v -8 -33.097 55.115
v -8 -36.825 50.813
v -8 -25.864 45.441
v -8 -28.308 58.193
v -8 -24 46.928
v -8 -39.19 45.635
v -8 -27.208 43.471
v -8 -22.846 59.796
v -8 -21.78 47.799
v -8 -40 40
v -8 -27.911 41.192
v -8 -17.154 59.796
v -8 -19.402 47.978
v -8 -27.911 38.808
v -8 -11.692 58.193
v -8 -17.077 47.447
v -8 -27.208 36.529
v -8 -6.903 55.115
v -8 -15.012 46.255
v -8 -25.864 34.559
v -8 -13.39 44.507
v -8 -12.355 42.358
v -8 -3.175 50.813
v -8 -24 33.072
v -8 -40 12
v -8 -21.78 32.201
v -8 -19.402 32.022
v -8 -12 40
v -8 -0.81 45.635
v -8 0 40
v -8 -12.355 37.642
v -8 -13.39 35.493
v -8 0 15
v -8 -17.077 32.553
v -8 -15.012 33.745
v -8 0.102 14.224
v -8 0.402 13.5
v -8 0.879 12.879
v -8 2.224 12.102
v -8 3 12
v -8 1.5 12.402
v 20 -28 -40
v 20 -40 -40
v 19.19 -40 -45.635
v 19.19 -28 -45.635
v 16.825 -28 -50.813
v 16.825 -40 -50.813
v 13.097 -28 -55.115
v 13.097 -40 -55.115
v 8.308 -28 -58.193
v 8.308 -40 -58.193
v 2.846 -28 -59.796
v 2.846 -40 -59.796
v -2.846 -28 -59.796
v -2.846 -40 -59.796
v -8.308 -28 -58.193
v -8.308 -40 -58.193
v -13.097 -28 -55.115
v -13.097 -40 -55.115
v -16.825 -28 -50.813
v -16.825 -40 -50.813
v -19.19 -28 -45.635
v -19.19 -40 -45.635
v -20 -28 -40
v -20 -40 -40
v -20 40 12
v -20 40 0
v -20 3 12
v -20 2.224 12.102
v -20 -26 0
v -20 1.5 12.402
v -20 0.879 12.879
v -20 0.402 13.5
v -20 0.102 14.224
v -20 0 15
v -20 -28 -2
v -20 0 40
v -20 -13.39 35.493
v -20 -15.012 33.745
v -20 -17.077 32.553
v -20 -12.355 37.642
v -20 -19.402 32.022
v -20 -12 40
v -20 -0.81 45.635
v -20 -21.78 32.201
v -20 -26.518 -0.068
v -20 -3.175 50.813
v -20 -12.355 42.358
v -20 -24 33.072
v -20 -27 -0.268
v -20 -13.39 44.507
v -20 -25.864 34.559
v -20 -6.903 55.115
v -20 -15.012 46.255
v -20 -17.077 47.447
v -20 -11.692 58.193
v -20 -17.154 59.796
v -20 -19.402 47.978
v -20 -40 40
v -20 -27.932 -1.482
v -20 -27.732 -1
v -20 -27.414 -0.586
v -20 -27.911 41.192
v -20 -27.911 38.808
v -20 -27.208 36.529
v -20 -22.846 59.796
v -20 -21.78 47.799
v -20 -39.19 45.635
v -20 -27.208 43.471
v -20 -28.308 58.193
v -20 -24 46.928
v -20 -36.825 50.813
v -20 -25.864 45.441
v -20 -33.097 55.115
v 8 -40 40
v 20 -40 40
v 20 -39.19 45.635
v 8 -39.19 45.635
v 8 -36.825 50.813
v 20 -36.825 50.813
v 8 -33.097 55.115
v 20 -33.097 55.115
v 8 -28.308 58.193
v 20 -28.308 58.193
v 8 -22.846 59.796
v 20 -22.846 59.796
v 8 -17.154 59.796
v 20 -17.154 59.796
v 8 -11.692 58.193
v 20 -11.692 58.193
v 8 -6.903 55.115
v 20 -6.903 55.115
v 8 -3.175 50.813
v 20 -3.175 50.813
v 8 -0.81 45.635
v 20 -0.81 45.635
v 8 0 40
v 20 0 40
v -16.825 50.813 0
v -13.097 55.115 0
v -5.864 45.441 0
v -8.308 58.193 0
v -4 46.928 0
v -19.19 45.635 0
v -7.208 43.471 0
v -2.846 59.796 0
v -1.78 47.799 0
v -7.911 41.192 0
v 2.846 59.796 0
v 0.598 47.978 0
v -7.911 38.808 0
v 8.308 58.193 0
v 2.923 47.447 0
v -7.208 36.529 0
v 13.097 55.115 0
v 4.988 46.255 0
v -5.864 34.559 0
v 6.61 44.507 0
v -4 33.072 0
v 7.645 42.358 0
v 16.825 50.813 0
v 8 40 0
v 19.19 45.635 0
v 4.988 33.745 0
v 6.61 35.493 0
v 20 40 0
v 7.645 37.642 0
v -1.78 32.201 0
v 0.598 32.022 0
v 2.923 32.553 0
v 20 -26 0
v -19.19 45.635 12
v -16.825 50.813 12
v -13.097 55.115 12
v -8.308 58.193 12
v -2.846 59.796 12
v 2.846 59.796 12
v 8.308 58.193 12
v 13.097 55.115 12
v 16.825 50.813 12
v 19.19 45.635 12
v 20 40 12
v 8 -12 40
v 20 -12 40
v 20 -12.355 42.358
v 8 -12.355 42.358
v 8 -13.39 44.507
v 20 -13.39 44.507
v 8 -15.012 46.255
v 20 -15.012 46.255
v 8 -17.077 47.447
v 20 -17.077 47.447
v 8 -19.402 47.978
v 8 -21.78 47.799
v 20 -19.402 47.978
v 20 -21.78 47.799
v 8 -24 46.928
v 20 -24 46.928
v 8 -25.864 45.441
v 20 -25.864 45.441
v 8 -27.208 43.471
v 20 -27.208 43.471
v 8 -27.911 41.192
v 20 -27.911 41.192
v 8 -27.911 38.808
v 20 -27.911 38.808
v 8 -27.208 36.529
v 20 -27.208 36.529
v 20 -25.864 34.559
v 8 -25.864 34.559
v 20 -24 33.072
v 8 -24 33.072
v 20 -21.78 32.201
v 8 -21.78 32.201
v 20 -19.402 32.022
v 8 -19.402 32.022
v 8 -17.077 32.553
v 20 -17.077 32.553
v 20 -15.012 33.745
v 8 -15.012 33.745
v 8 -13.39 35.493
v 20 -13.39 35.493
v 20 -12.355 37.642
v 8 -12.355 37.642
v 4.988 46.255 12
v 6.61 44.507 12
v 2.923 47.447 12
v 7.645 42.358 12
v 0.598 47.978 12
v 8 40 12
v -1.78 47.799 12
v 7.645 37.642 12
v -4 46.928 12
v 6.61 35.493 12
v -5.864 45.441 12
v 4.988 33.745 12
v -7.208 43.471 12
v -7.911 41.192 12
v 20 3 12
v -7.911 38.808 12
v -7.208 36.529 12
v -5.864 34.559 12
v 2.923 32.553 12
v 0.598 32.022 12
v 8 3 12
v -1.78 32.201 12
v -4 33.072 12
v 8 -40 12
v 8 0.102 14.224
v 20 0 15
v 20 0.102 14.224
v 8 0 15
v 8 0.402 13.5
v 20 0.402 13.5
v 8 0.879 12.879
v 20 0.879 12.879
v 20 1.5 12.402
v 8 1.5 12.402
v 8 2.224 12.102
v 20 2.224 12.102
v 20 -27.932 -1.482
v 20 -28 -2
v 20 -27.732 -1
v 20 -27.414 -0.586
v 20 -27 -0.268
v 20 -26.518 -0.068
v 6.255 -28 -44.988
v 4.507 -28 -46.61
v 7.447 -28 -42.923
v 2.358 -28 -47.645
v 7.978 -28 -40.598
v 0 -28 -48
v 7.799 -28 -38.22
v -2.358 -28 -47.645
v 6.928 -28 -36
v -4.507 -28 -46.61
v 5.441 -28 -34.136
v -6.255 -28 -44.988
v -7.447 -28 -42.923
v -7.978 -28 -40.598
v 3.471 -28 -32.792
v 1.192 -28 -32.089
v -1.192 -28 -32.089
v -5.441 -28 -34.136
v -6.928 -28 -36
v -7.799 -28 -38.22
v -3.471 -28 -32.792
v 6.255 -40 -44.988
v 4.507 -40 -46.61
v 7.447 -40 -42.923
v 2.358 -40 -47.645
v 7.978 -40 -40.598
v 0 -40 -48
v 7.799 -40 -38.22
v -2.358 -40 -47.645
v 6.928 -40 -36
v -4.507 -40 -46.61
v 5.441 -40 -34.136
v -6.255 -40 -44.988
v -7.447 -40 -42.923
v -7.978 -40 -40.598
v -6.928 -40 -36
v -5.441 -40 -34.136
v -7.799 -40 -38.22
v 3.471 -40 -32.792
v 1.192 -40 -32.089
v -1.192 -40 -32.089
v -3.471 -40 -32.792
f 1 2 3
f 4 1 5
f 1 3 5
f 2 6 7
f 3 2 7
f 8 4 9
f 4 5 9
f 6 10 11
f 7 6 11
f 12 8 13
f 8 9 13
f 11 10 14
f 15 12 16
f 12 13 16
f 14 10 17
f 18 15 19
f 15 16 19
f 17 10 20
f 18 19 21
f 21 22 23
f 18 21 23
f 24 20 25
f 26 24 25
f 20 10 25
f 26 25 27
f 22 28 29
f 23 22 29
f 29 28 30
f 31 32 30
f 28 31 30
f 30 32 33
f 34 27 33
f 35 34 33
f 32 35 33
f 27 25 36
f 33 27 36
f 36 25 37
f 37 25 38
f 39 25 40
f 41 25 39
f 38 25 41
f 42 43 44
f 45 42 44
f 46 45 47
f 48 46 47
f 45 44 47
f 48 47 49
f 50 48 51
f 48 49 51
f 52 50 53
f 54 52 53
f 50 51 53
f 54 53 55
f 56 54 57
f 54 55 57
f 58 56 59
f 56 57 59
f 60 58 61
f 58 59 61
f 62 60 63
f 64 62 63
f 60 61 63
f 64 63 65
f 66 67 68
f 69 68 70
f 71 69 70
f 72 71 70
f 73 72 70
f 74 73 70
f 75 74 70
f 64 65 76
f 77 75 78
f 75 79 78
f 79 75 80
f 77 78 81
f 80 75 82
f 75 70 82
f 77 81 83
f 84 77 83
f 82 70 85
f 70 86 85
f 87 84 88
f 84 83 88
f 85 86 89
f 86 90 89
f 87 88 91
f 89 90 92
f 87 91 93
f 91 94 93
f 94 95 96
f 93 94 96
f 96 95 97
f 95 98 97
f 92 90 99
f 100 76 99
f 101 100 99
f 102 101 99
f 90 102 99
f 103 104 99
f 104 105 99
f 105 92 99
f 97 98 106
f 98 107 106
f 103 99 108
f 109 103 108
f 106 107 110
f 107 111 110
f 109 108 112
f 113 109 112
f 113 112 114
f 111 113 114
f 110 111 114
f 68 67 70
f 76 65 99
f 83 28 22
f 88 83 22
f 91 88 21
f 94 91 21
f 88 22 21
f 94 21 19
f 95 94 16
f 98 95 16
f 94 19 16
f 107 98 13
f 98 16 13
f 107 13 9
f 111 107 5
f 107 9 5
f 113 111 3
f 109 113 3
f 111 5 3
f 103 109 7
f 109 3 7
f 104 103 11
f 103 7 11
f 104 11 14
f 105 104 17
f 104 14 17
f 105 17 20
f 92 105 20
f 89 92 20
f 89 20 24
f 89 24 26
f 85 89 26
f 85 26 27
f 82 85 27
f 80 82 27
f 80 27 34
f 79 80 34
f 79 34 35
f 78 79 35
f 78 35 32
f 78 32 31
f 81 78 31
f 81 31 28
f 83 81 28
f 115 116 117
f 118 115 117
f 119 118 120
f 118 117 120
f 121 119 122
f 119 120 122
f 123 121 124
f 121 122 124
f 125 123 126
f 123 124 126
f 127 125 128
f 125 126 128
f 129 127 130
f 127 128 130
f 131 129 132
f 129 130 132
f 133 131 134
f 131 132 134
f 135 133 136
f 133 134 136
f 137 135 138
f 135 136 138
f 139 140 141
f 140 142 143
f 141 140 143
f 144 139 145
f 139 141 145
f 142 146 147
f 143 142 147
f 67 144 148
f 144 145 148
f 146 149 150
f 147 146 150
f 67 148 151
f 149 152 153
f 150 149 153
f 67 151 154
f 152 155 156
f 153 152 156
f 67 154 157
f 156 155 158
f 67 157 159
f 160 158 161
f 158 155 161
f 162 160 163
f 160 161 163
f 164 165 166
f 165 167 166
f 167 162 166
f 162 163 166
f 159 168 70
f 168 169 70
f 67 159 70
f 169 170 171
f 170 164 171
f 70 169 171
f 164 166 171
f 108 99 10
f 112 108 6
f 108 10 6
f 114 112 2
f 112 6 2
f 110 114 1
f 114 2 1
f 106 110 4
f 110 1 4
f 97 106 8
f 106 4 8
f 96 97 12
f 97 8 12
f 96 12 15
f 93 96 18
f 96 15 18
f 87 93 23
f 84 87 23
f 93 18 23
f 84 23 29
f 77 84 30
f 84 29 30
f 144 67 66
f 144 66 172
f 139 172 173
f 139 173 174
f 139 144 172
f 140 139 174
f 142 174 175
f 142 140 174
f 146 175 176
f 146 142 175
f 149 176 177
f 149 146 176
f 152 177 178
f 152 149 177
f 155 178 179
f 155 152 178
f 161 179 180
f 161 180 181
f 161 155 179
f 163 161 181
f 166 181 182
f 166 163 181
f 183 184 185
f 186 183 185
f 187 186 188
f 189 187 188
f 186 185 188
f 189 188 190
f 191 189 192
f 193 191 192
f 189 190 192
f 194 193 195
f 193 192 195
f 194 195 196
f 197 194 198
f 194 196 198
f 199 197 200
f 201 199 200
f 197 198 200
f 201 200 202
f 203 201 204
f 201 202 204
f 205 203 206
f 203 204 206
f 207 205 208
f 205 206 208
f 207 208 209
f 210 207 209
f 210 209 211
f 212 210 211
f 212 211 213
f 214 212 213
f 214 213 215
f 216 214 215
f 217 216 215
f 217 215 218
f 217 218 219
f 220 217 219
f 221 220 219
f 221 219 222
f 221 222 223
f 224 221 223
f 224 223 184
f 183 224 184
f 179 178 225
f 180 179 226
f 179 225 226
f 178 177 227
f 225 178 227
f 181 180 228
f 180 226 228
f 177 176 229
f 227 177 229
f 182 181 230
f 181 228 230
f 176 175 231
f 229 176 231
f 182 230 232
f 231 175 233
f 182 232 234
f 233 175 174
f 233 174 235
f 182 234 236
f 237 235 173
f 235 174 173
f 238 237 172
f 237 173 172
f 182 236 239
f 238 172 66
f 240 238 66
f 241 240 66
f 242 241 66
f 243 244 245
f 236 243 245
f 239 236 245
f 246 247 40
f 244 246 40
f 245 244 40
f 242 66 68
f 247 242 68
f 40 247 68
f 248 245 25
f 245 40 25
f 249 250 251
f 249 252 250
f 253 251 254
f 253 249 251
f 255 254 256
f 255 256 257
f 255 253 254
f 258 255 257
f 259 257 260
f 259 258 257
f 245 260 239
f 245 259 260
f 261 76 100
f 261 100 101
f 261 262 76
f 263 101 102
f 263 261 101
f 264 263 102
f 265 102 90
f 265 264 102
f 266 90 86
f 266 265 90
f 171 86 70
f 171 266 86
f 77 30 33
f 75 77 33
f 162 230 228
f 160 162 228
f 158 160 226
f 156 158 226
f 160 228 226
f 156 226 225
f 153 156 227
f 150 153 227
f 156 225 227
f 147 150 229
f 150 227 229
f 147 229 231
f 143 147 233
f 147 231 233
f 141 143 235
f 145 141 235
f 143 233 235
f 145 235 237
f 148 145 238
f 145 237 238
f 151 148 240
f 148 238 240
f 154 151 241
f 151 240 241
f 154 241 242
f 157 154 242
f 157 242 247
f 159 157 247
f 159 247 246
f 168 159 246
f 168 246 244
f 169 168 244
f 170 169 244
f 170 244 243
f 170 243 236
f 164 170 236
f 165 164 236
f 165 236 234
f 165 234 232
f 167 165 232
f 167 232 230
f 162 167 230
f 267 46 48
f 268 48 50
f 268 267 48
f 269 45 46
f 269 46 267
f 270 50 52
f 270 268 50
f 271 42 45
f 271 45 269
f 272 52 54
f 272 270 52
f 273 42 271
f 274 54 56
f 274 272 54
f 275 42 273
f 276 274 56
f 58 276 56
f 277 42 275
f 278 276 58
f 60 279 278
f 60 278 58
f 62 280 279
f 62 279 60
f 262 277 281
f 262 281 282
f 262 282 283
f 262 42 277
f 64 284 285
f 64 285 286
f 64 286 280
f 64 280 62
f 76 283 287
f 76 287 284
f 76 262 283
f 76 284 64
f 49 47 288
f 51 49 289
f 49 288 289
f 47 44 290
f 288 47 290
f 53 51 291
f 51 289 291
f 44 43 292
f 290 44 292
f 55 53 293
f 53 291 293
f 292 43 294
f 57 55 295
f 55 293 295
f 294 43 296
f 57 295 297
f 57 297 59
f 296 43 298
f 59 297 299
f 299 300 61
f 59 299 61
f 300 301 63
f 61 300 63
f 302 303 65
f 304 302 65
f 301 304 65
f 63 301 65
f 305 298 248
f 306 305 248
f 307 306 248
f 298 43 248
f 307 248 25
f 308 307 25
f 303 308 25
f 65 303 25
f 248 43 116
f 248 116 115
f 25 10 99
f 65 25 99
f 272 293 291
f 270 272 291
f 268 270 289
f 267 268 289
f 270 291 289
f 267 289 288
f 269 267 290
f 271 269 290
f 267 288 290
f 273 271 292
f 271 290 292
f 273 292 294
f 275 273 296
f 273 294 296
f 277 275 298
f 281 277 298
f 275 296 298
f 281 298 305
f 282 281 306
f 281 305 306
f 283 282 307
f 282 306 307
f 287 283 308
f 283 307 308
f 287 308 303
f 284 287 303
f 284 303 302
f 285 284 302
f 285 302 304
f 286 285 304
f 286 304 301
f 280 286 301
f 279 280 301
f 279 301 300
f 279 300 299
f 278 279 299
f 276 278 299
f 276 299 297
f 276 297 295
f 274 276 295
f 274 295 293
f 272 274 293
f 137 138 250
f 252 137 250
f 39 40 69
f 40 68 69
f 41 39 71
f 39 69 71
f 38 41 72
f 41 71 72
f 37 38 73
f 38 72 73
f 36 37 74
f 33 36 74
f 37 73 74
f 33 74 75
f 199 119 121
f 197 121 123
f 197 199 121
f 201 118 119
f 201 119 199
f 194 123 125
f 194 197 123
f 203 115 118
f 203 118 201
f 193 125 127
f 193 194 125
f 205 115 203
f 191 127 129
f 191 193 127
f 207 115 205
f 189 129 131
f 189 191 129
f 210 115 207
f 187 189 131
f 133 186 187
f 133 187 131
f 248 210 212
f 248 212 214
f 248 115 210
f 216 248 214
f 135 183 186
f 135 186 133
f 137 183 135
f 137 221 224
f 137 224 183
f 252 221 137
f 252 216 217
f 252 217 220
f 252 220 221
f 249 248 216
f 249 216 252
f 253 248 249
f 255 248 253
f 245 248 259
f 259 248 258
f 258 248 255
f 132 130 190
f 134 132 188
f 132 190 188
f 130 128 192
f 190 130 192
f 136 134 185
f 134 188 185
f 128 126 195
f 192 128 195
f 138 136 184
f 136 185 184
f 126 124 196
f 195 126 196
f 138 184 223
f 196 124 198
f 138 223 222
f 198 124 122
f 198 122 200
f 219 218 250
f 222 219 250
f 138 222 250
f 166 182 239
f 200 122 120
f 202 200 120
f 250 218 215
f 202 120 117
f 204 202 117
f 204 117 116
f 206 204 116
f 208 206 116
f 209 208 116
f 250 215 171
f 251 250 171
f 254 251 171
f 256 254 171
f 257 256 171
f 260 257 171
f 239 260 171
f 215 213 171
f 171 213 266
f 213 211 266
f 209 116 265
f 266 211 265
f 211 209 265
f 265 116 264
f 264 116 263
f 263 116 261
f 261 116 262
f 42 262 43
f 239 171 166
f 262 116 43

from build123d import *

# Parameters (mm, degrees)
BOSS_EXTRUDE3_DEPTH = 12
BOSS_EXTRUDE4_DEPTH = 20
BOSS_EXTRUDE5_DEPTH = 12
SKETCH12_W          = 16
SKETCH12_H          = 40
CUT_EXTRUDE1_DEPTH  = 96.833188406
SKETCH13_R          = 8
CUT_EXTRUDE2_DEPTH  = 94.808315196
SKETCH14_R          = 8
CUT_EXTRUDE3_DEPTH  = 96.833188406
SKETCH15_R          = 8
CUT_EXTRUDE4_DEPTH  = 119.321595662
FILLET1_R           = 3
FILLET2_R           = 2


with BuildPart() as part:
    # Sketch7 → Boss-Extrude3 (new body)
    with BuildSketch(Plane(origin=(0, 0, 0), x_dir=(0, 1, 0), z_dir=(0, 0, 1))):
        with BuildLine():
            Line((0, -20), (0, 20))
            Line((0, 20), (40, 20))
            ThreePointArc((40, 20), (60, 0), (40, -20))
            Line((40, -20), (0, -20))
        make_face()
    extrude(amount=BOSS_EXTRUDE3_DEPTH)

    # Sketch9 → Boss-Extrude4 (add, symmetric)
    with BuildSketch(Plane.YZ):
        with BuildLine():
            Line((0, 0), (-40, 0))
            Line((-40, 0), (-40, 40))
            ThreePointArc((-40, 40), (-20, 60), (0, 40))
            Line((0, 40), (0, 0))
        make_face()
    extrude(amount=BOSS_EXTRUDE4_DEPTH, both=True)

    # Sketch10 → Boss-Extrude5 (add)
    with BuildSketch(Plane.XZ.offset(40)):
        with BuildLine():
            Line((-20, 0), (20, 0))
            Line((20, 0), (20, -39.999997874))
            ThreePointArc((20, -39.999997874), (1.063e-06, -60), (-20, -40))
            Line((-20, -40), (-20, 0))
        make_face()
    extrude(amount=-BOSS_EXTRUDE5_DEPTH)

    # Sketch12 → Cut-Extrude1 (cut, through all)
    with BuildSketch(Plane.XY.offset(12)):
        with Locations((0, -20)):
            Rectangle(SKETCH12_W, SKETCH12_H)
    extrude(amount=CUT_EXTRUDE1_DEPTH, mode=Mode.SUBTRACT)

    # Sketch13 → Cut-Extrude2 (cut, through all)
    with BuildSketch(Plane.YZ.offset(20)):
        with Locations((-20, 40)):
            Circle(SKETCH13_R)
    extrude(amount=-CUT_EXTRUDE2_DEPTH, mode=Mode.SUBTRACT)

    # Sketch14 → Cut-Extrude3 (cut, through all)
    with BuildSketch(Plane.XY.offset(12)):
        with Locations((0, 40)):
            Circle(SKETCH14_R)
    extrude(amount=-CUT_EXTRUDE3_DEPTH, mode=Mode.SUBTRACT)

    # Sketch15 → Cut-Extrude4 (cut, through all)
    with BuildSketch(Plane.XZ.offset(40)):
        with Locations(Location((0, -40, 0), (0, 0, 270))):
            Circle(SKETCH15_R)
    extrude(amount=-CUT_EXTRUDE4_DEPTH, mode=Mode.SUBTRACT)

    # Fillet1
    fillet1_edges = [part.edges().sort_by_distance(p)[0] for p in [
        (14, 0, 12),
        (-14, 0, 12),
    ]]
    fillet(fillet1_edges, radius=FILLET1_R)

    # Fillet2
    fillet2_edges = [part.edges().sort_by_distance(p)[0] for p in [
        (0, -28, 0),
    ]]
    fillet(fillet2_edges, radius=FILLET2_R)


solid = part.part
